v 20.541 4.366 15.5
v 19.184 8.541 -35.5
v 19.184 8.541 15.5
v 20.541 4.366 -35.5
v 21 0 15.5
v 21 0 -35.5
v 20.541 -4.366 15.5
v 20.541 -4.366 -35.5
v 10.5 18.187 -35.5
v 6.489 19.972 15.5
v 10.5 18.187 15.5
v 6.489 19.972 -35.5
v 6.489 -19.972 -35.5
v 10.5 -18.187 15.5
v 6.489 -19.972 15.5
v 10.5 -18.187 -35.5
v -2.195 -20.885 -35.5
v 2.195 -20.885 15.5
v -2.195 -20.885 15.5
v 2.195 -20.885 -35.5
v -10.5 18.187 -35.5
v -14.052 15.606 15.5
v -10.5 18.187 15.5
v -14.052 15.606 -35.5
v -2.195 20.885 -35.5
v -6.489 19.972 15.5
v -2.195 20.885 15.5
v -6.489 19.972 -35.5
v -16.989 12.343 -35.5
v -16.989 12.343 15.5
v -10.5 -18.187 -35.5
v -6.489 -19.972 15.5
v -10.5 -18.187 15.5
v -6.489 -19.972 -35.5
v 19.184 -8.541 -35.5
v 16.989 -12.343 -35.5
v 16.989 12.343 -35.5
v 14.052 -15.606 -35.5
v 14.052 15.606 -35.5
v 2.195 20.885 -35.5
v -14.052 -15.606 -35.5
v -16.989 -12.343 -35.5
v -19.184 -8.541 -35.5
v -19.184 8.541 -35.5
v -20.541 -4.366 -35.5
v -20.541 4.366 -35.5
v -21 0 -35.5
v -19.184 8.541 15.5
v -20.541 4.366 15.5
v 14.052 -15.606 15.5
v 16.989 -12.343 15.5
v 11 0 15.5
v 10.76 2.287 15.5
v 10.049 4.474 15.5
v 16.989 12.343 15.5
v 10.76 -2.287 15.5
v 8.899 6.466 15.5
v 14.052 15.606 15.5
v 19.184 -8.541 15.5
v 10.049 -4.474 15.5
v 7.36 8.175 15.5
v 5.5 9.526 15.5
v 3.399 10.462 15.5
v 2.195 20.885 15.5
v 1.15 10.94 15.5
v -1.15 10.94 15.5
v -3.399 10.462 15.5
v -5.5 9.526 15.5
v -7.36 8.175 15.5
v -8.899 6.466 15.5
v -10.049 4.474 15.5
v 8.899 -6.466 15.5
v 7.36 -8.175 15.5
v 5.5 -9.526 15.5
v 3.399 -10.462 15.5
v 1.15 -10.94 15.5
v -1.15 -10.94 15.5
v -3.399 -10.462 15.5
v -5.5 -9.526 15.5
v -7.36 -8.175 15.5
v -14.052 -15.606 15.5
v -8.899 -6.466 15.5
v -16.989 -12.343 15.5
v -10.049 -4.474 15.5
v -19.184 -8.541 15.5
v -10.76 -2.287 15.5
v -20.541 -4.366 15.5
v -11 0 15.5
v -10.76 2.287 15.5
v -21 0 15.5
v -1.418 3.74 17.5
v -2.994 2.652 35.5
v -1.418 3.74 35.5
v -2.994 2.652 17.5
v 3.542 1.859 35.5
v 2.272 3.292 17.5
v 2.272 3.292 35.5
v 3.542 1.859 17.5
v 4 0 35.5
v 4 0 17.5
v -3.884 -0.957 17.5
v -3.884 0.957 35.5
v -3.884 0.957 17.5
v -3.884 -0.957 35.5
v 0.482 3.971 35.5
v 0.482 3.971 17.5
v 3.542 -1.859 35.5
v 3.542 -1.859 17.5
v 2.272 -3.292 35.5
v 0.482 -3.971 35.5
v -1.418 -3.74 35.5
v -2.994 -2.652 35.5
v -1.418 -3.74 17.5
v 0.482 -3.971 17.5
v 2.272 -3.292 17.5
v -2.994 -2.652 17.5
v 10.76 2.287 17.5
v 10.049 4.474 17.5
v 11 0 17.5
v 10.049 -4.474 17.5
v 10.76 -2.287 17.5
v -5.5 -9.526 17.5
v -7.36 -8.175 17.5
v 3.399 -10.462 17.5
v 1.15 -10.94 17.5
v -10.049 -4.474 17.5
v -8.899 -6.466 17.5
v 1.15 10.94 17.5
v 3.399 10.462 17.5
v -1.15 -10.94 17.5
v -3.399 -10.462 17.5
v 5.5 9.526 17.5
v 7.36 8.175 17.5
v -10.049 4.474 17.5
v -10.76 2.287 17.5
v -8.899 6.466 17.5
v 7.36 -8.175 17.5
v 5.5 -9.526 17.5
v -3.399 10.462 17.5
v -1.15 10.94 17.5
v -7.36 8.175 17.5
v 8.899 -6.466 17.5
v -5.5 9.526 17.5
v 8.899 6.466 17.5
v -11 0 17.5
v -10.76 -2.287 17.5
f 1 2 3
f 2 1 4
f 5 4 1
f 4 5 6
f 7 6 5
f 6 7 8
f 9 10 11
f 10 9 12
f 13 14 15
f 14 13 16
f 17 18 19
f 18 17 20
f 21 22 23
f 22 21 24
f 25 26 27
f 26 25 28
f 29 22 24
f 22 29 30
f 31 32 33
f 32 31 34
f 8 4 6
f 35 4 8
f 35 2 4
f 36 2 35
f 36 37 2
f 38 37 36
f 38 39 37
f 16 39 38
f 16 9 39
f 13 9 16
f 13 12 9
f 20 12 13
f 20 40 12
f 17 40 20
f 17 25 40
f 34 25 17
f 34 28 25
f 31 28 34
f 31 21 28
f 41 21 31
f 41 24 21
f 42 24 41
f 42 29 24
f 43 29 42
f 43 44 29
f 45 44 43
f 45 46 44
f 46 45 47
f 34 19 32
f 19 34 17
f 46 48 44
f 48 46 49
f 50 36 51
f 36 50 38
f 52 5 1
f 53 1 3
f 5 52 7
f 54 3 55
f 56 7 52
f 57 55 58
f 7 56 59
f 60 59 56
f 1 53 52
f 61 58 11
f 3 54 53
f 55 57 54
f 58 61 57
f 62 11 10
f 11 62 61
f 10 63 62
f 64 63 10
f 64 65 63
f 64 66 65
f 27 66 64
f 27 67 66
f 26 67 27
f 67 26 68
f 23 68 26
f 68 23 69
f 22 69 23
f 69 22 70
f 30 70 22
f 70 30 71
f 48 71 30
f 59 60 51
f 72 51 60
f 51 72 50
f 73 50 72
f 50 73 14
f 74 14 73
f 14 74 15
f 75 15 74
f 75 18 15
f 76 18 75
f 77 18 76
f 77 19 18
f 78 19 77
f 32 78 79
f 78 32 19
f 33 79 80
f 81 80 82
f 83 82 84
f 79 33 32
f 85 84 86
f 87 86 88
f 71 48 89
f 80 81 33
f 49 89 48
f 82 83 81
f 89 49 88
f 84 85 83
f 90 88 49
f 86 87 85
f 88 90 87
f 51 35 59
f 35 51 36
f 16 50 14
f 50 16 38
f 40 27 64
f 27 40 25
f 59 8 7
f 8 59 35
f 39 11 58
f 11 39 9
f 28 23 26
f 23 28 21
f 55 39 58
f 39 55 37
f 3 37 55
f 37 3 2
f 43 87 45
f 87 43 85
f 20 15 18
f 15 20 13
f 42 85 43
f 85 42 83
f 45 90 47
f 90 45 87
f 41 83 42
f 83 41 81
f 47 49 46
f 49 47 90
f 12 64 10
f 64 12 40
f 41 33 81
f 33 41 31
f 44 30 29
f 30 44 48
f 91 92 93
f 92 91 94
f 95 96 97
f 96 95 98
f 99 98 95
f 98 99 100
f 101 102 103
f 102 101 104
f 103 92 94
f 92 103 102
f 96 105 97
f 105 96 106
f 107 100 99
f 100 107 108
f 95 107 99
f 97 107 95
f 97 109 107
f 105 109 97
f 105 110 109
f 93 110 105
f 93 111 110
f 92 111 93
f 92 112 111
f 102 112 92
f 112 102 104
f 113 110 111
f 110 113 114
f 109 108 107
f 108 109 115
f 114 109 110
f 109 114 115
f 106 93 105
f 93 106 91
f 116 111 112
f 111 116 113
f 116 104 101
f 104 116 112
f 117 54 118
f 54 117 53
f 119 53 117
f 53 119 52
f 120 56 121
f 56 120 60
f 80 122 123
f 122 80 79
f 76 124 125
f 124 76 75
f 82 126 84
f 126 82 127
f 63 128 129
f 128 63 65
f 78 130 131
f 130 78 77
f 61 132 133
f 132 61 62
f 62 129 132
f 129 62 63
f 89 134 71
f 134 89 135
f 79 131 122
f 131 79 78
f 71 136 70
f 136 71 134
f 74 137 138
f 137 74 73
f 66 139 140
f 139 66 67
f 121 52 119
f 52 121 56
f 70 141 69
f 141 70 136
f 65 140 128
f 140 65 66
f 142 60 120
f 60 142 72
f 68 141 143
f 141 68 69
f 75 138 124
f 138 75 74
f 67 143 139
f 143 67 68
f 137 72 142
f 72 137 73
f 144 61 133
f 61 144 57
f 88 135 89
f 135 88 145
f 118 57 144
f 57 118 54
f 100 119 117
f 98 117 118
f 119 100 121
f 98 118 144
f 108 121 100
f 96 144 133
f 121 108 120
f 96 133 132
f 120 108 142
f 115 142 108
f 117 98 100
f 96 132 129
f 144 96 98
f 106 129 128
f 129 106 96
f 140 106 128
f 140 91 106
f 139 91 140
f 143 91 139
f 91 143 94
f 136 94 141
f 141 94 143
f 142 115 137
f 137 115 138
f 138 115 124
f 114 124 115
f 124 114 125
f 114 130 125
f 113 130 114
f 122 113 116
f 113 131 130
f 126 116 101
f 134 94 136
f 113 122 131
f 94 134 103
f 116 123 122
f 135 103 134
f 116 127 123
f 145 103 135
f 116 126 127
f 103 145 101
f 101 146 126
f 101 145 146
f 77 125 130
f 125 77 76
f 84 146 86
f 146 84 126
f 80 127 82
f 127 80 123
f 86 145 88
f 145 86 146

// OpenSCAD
use <common.scad>

module planetary_gearbox_mg17_g20(col = [0.16, 0.16, 0.16]) {
    body_len = 51;
    gearbox_mg17(body_len, col);
}

planetary_gearbox_mg17_g20();
